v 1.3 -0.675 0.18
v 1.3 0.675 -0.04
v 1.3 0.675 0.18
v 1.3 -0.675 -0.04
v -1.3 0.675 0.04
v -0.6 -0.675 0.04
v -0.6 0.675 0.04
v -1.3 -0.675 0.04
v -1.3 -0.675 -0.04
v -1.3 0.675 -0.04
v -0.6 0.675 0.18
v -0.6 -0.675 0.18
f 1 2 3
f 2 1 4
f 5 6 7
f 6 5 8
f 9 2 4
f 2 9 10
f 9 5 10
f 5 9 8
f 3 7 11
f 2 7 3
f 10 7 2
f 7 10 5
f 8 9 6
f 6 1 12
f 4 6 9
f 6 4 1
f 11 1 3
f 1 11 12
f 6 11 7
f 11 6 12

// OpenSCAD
//Resolution
$fn=100;

translate([0,0,0]) cube(size=[2.6, 1.35, 0.08], center=true);
translate([0.35,0,0.08]) cube(size=[1.9, 1.35, 0.2], center=true);
